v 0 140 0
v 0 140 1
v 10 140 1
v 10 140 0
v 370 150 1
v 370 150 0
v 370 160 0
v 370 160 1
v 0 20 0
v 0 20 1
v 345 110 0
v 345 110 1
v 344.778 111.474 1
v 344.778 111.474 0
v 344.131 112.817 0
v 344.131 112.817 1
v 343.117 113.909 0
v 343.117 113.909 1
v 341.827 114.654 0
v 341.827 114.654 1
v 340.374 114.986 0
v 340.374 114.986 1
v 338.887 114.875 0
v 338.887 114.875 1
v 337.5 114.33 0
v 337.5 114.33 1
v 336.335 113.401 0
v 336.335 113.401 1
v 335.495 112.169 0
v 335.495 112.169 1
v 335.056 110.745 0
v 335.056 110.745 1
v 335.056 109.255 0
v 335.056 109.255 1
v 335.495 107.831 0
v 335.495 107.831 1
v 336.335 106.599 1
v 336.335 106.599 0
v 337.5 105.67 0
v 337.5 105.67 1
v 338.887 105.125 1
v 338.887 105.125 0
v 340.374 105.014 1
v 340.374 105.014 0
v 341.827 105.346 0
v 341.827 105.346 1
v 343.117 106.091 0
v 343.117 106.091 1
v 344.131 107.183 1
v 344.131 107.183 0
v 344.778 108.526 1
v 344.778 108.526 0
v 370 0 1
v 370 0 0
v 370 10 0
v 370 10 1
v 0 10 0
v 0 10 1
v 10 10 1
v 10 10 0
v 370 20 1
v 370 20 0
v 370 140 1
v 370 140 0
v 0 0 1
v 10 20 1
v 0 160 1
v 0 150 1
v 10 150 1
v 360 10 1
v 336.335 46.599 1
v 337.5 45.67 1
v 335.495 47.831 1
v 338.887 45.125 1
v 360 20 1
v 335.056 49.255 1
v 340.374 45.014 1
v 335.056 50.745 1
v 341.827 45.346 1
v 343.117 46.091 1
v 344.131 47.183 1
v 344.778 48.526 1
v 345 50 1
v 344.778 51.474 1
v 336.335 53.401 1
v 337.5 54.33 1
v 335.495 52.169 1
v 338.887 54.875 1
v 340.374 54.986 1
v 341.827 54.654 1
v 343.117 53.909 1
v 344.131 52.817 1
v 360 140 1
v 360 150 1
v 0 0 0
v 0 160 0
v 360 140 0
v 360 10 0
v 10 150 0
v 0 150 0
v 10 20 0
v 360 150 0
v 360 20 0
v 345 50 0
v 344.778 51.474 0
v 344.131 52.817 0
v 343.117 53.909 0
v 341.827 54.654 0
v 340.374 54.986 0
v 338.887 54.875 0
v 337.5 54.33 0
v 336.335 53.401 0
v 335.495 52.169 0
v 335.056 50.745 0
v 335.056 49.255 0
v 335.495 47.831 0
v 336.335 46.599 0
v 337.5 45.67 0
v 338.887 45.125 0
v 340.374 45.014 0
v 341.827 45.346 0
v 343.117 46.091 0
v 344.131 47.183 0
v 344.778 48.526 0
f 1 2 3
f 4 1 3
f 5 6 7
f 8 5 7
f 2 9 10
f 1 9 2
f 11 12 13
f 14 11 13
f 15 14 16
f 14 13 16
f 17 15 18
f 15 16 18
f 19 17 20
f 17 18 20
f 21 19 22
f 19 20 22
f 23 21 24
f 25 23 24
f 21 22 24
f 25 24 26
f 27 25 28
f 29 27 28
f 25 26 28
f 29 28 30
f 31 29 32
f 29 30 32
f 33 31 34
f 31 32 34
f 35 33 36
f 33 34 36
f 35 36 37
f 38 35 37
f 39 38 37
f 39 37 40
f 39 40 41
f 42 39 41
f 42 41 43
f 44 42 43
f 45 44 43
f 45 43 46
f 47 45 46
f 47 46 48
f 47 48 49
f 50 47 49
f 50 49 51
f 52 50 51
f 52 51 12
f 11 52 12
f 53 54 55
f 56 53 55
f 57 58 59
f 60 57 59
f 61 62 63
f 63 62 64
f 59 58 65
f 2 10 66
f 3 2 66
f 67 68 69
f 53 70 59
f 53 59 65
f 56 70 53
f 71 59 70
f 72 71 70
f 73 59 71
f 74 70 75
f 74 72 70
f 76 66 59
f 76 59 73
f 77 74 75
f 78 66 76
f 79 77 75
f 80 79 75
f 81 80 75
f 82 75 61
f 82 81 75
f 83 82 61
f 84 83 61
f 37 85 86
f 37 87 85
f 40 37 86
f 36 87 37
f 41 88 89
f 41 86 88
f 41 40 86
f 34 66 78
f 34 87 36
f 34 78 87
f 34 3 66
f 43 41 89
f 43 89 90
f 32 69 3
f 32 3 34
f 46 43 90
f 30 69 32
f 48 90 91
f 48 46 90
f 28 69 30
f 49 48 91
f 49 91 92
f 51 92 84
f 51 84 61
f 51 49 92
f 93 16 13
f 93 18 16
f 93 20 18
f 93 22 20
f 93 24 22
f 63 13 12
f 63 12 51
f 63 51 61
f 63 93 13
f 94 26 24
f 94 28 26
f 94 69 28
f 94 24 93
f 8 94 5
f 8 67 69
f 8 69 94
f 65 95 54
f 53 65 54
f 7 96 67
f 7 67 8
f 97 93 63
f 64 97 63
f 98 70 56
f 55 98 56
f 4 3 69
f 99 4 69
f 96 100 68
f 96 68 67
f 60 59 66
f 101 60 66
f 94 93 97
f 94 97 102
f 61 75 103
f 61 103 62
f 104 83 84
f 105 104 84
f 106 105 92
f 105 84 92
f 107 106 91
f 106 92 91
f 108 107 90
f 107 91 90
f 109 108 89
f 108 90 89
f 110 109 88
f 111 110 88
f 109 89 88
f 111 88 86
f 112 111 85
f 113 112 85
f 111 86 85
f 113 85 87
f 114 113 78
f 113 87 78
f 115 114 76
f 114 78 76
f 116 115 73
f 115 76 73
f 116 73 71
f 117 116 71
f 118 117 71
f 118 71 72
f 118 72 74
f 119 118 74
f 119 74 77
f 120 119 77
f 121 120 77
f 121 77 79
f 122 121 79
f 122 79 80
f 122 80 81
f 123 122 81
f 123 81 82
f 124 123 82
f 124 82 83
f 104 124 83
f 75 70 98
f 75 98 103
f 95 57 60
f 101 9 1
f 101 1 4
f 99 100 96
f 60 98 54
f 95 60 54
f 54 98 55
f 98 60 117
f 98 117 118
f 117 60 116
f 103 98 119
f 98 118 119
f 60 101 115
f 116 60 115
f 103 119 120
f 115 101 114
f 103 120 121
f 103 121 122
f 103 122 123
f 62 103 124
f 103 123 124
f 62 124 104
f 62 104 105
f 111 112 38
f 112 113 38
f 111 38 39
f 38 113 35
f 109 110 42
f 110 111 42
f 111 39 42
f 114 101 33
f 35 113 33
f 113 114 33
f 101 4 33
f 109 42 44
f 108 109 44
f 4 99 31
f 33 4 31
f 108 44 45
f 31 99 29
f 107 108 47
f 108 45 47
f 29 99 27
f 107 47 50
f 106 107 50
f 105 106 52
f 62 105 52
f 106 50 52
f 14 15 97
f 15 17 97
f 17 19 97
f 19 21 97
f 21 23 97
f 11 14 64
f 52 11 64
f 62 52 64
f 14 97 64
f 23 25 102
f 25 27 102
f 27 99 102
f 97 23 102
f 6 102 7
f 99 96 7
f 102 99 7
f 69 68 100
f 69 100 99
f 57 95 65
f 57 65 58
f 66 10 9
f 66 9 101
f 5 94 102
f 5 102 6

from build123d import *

# Parameters (mm, degrees)
SKETCH1_W                  = 370
SKETCH1_H                  = 160
KICH_THUOC_TONG_QUAN_DEPTH = 1
LO_CHOT_CO_DINH_REACH      = 405.114
SKETCH2_W                  = 10
SKETCH2_H                  = 10
LO_THONG_KHI_REACH         = 405.114
SKETCH3_R                  = 5


with BuildPart() as part:
    # Sketch1 → kich_thuoc_tong_quan (new body)
    with BuildSketch(Plane.XY):
        with Locations((185, 80)):
            Rectangle(SKETCH1_W, SKETCH1_H)
    extrude(amount=KICH_THUOC_TONG_QUAN_DEPTH)

    # Sketch2 → lo_chot_co_dinh (cut, up to next)
    with BuildSketch(Plane.XY.offset(1), mode=Mode.PRIVATE) as lo_chot_co_dinh_sk1:
        with Locations((5, 145)):
            Rectangle(SKETCH2_W, SKETCH2_H)
    lo_chot_co_dinh_tool1 = extrude(lo_chot_co_dinh_sk1.sketch, amount=-LO_CHOT_CO_DINH_REACH, mode=Mode.PRIVATE) & part.part
    # Sketch2 → lo_chot_co_dinh (cut, up to next)
    with BuildSketch(Plane.XY.offset(1), mode=Mode.PRIVATE) as lo_chot_co_dinh_sk2:
        with Locations((365, 145)):
            Rectangle(SKETCH2_W, SKETCH2_H)
    lo_chot_co_dinh_tool2 = extrude(lo_chot_co_dinh_sk2.sketch, amount=-LO_CHOT_CO_DINH_REACH, mode=Mode.PRIVATE) & part.part
    # Sketch2 → lo_chot_co_dinh (cut, up to next)
    with BuildSketch(Plane.XY.offset(1), mode=Mode.PRIVATE) as lo_chot_co_dinh_sk3:
        with Locations((365, 15)):
            Rectangle(SKETCH2_W, SKETCH2_H)
    lo_chot_co_dinh_tool3 = extrude(lo_chot_co_dinh_sk3.sketch, amount=-LO_CHOT_CO_DINH_REACH, mode=Mode.PRIVATE) & part.part
    # Sketch2 → lo_chot_co_dinh (cut, up to next)
    with BuildSketch(Plane.XY.offset(1), mode=Mode.PRIVATE) as lo_chot_co_dinh_sk4:
        with Locations((5, 15)):
            Rectangle(SKETCH2_W, SKETCH2_H)
    lo_chot_co_dinh_tool4 = extrude(lo_chot_co_dinh_sk4.sketch, amount=-LO_CHOT_CO_DINH_REACH, mode=Mode.PRIVATE) & part.part
    add(lo_chot_co_dinh_tool1.solids().sort_by_distance((5, 145, 1))[0], mode=Mode.SUBTRACT)
    add(lo_chot_co_dinh_tool2.solids().sort_by_distance((365, 145, 1))[0], mode=Mode.SUBTRACT)
    add(lo_chot_co_dinh_tool3.solids().sort_by_distance((365, 15, 1))[0], mode=Mode.SUBTRACT)
    add(lo_chot_co_dinh_tool4.solids().sort_by_distance((5, 15, 1))[0], mode=Mode.SUBTRACT)

    # Sketch3 → lo_thong_khi (cut, up to next)
    with BuildSketch(Plane.XY.offset(1), mode=Mode.PRIVATE) as lo_thong_khi_sk1:
        with Locations((340, 110)):
            Circle(SKETCH3_R)
    lo_thong_khi_tool1 = extrude(lo_thong_khi_sk1.sketch, amount=-LO_THONG_KHI_REACH, mode=Mode.PRIVATE) & part.part
    # Sketch3 → lo_thong_khi (cut, up to next)
    with BuildSketch(Plane.XY.offset(1), mode=Mode.PRIVATE) as lo_thong_khi_sk2:
        with Locations((340, 50)):
            Circle(SKETCH3_R)
    lo_thong_khi_tool2 = extrude(lo_thong_khi_sk2.sketch, amount=-LO_THONG_KHI_REACH, mode=Mode.PRIVATE) & part.part
    add(lo_thong_khi_tool1.solids().sort_by_distance((340, 110, 1))[0], mode=Mode.SUBTRACT)
    add(lo_thong_khi_tool2.solids().sort_by_distance((340, 50, 1))[0], mode=Mode.SUBTRACT)


solid = part.part
